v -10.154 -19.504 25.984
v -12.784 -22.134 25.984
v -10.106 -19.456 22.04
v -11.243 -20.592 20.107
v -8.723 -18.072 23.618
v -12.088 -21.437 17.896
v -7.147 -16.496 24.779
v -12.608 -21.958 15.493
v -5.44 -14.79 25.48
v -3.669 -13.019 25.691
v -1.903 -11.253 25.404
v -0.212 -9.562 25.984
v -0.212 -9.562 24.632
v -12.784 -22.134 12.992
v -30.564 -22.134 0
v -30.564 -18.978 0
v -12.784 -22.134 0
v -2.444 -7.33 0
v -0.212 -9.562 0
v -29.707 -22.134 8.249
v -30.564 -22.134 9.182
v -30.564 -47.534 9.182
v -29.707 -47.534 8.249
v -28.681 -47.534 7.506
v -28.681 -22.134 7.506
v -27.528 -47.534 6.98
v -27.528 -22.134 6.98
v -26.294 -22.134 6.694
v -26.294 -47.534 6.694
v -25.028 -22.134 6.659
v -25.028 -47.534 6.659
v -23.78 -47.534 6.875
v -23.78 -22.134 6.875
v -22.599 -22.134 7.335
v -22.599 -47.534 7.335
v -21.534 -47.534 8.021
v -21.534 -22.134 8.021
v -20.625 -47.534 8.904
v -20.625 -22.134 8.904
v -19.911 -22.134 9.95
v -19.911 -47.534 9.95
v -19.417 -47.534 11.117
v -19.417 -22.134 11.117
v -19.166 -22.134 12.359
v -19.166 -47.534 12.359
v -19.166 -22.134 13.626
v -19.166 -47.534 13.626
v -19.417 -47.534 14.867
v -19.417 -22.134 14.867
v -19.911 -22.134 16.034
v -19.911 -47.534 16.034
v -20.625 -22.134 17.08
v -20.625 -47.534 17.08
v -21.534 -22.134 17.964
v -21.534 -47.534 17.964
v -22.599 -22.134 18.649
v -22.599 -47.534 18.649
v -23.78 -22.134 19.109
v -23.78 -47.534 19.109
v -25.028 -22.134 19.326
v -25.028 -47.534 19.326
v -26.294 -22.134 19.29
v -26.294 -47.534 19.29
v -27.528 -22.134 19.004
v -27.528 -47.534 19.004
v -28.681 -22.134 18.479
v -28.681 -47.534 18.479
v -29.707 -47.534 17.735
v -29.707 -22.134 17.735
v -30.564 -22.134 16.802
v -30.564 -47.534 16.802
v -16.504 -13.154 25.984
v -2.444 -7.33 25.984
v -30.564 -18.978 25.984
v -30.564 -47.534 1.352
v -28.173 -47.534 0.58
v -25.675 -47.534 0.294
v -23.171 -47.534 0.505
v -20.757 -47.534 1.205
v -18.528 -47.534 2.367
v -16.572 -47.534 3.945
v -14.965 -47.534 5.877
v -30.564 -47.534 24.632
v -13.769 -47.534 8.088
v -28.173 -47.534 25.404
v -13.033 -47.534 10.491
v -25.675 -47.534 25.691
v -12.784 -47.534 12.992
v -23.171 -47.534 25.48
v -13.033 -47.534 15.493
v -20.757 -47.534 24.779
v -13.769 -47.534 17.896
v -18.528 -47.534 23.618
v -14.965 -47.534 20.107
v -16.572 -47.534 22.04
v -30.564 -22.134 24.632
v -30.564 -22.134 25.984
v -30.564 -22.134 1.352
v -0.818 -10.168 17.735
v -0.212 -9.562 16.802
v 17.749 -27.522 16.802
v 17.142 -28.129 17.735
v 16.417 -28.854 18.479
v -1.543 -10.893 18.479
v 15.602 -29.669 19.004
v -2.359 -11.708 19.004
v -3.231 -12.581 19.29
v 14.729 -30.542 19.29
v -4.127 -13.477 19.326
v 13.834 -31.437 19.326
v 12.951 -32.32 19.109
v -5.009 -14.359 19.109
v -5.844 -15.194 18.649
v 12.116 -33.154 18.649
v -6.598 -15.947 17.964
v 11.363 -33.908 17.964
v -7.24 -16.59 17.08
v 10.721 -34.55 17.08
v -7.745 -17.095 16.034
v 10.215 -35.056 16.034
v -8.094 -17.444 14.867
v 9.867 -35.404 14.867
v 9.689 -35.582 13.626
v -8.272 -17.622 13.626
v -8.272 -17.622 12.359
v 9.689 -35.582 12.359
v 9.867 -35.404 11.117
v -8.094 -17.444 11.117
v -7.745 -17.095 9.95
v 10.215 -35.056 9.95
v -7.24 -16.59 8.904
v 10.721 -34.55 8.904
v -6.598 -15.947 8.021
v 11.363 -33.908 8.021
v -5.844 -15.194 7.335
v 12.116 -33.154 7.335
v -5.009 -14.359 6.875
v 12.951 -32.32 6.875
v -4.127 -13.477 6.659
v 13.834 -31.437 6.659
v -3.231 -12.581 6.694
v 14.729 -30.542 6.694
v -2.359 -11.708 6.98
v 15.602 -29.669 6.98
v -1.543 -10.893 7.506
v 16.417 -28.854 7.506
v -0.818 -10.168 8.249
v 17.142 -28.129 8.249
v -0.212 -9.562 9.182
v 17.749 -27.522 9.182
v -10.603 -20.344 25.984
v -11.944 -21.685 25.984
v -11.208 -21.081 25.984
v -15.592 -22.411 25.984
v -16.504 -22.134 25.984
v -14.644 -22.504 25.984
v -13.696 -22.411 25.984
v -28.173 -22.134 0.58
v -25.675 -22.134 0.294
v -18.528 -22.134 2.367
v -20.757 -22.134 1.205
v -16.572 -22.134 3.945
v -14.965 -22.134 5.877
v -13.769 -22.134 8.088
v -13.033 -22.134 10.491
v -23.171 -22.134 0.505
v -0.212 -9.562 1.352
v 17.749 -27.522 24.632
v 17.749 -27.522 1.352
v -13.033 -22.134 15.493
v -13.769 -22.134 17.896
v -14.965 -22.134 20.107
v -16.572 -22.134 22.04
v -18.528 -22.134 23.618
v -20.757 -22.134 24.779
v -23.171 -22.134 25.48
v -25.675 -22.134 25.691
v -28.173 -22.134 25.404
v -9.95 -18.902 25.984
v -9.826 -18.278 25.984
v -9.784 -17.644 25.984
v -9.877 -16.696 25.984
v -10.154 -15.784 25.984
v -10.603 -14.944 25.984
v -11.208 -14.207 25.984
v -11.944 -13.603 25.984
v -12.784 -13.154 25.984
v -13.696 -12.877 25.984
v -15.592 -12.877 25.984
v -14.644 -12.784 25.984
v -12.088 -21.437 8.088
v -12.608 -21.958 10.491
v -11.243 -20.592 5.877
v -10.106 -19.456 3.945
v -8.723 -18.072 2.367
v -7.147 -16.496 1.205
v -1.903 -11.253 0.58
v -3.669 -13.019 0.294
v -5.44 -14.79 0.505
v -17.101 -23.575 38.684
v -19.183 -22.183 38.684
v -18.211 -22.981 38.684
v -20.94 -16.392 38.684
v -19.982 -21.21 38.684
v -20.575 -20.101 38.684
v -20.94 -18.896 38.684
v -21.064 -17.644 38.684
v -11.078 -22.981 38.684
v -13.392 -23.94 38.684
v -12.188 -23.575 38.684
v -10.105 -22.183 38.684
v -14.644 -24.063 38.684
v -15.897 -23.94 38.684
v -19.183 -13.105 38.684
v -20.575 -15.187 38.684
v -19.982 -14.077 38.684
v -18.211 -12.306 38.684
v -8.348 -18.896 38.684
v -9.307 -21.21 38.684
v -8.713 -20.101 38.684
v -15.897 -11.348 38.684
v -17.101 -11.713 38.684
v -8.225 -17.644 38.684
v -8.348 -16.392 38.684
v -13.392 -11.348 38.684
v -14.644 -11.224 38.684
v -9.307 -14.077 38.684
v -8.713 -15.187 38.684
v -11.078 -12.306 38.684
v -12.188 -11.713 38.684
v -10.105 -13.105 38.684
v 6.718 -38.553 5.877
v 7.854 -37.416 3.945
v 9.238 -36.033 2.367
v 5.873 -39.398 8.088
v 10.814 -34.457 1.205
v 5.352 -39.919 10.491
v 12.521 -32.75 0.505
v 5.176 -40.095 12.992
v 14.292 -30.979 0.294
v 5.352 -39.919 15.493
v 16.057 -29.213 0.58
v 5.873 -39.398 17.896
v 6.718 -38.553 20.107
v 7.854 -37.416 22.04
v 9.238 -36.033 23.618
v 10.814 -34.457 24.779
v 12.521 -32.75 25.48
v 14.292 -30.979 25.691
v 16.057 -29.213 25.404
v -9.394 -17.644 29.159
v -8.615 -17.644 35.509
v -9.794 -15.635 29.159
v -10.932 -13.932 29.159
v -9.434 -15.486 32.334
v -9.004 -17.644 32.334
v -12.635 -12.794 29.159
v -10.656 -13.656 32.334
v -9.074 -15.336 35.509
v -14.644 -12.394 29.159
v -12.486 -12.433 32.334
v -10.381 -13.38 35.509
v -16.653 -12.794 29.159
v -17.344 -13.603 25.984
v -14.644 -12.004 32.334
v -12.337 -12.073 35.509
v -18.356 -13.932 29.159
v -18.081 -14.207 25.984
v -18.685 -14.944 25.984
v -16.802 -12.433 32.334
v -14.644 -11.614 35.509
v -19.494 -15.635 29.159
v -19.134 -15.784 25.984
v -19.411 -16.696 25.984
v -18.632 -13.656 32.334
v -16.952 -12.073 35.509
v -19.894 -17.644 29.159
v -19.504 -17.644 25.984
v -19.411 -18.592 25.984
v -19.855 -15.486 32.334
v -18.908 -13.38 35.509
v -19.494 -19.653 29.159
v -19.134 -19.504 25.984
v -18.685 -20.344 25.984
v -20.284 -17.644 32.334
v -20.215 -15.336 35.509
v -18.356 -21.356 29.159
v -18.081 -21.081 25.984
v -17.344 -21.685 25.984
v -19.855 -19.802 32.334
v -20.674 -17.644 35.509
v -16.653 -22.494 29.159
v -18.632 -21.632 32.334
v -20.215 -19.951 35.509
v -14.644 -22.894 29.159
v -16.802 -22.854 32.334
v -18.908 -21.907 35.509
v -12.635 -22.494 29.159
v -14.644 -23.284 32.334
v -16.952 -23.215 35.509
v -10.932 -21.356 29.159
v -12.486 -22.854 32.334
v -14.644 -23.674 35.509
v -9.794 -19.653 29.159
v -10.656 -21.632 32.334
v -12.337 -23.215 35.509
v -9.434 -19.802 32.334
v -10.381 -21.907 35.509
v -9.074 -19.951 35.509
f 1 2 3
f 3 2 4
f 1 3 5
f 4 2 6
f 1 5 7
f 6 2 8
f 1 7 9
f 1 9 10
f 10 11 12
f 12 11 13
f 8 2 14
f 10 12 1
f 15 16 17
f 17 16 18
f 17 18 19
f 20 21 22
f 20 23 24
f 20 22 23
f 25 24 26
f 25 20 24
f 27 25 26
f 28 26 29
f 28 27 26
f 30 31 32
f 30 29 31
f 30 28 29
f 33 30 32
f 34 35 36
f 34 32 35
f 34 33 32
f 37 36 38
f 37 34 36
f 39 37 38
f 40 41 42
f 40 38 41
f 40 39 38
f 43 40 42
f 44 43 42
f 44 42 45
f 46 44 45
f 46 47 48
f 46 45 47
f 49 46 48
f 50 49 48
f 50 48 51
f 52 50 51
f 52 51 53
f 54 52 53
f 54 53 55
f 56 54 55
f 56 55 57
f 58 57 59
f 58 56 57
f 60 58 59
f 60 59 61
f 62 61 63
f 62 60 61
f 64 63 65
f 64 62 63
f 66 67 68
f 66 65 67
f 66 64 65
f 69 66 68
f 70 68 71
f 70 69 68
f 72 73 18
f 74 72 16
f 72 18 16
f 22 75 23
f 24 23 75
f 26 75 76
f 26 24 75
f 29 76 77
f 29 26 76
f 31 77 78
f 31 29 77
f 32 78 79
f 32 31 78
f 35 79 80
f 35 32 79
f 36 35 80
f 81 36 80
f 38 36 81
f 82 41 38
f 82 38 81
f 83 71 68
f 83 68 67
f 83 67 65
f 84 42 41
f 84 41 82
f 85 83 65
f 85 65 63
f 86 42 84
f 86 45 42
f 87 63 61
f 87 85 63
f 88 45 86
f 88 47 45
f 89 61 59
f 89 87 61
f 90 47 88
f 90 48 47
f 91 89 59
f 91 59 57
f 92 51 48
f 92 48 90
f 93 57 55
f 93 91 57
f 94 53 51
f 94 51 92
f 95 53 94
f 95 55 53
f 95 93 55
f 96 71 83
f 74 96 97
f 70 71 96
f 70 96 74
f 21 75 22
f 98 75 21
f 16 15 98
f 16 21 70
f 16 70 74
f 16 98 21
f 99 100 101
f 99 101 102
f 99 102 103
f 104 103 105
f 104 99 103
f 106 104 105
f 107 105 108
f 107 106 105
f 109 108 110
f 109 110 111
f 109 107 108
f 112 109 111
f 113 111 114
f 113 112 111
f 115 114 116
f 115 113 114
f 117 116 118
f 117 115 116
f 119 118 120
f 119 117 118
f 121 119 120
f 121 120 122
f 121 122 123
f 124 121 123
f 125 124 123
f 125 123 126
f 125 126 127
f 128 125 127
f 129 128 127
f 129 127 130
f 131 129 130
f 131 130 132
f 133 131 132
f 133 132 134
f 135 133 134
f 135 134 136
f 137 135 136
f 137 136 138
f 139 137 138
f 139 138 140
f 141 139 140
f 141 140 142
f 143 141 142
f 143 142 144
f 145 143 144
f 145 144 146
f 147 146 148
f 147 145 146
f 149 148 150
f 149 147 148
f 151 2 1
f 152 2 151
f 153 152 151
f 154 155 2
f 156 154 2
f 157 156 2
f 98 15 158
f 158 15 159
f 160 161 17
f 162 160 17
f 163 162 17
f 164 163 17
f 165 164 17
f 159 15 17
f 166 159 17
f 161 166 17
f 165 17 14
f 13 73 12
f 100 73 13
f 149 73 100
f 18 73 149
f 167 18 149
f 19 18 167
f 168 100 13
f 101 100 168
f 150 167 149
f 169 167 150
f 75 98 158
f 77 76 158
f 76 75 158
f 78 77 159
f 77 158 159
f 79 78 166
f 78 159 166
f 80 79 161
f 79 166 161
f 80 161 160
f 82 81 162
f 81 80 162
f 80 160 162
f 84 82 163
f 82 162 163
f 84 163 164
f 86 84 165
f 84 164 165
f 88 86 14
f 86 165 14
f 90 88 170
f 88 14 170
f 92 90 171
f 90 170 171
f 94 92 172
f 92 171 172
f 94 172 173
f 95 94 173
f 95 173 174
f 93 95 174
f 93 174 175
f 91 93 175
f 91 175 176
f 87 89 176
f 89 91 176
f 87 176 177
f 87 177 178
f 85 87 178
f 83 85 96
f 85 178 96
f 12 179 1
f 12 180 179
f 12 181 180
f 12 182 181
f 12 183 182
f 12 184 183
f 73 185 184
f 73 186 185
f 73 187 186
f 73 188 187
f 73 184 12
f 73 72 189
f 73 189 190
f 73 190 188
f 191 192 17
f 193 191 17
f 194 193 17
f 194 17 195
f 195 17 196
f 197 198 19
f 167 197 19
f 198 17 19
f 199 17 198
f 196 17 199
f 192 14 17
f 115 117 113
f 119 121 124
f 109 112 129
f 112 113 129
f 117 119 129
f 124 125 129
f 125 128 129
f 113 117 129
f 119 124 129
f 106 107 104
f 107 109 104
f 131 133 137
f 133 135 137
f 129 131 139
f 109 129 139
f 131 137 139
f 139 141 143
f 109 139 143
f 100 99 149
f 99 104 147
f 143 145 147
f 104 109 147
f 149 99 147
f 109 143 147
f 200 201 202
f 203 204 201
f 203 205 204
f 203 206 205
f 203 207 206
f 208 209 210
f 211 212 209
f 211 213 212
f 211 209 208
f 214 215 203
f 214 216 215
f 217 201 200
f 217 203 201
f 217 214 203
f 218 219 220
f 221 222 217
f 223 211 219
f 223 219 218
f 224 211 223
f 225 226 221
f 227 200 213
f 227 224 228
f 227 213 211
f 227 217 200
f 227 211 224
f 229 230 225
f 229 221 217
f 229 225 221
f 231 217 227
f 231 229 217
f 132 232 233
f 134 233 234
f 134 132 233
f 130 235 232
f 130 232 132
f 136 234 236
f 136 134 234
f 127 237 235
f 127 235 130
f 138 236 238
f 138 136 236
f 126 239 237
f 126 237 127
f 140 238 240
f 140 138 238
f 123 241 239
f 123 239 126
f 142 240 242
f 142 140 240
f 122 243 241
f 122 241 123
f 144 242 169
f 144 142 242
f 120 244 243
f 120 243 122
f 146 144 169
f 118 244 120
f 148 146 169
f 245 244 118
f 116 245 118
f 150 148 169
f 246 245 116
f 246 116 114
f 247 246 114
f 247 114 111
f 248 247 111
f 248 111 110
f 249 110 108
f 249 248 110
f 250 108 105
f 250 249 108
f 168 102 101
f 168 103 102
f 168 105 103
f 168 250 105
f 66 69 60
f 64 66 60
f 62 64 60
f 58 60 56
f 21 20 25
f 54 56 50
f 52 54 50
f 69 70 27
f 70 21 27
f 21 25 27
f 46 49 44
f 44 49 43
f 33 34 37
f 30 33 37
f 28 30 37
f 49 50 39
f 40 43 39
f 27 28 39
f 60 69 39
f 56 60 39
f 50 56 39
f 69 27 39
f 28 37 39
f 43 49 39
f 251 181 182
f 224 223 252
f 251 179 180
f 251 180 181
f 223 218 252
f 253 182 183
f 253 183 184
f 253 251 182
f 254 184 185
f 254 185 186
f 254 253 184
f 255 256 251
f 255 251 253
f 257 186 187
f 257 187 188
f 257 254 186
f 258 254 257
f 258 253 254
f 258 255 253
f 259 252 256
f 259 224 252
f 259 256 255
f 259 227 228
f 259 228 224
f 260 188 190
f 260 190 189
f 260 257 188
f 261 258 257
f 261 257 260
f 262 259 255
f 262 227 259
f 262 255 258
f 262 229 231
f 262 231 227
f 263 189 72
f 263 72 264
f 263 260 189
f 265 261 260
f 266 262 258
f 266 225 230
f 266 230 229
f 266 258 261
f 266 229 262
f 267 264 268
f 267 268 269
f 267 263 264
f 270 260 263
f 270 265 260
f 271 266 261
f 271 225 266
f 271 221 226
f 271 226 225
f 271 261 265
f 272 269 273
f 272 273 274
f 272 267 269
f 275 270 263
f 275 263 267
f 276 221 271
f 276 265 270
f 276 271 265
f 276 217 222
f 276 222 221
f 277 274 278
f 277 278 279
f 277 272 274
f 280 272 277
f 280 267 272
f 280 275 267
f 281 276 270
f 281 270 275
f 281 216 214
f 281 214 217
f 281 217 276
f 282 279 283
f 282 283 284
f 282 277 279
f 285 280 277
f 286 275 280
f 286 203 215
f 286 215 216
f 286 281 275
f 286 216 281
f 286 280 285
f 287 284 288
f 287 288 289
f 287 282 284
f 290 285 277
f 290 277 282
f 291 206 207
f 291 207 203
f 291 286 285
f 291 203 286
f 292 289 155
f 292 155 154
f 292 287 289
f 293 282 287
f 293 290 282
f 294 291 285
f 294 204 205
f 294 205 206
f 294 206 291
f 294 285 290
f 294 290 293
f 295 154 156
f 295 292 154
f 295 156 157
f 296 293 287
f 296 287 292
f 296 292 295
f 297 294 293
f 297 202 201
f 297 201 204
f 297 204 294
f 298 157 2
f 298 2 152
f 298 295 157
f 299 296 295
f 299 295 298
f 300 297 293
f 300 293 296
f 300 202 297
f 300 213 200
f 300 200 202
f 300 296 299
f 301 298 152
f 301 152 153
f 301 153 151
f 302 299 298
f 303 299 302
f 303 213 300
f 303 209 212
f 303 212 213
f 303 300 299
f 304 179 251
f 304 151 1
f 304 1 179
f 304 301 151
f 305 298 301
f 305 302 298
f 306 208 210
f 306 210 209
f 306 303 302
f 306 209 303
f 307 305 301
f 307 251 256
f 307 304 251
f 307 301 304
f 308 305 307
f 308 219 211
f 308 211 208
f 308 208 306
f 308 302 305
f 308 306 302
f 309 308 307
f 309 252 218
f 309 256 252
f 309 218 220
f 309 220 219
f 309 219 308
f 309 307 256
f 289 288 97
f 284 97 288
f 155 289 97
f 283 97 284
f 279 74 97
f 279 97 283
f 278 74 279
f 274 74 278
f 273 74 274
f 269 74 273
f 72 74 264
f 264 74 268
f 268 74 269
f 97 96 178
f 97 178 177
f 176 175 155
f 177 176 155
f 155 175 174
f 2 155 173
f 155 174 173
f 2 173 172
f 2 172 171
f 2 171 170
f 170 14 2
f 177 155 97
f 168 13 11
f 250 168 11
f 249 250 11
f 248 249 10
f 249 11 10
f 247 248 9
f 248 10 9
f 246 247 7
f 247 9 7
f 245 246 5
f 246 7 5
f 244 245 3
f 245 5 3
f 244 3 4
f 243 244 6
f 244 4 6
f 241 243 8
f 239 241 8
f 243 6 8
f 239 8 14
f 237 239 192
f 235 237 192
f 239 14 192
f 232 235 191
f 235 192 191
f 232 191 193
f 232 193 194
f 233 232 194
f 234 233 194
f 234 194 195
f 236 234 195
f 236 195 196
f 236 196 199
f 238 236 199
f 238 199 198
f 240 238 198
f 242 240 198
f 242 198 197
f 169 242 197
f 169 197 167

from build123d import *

# Parameters (mm, degrees)
F1_DEPTH = 25.9842
F2_R     = 12.7
F2_R_2   = 6.35
F3_DEPTH = 25.4
F4_R     = 12.7
F4_R_2   = 6.35
F5_DEPTH = 25.4
F7_R     = 4.860079591
F8_DEPTH = 12.7
F8_TAPER = -7
F6_W     = 22.3425124863
F6_H     = 36.2117751569
F9_DEPTH = 38.6852001


with BuildPart() as f1:
    # F0 (on Top) → F1 (new body)
    with BuildSketch(Plane.XY):
        Polygon((5.17619859, -4.1735334439), (-38.1843136522, -22.134045686), (-12.7843136522, -22.134045686), align=None)
    extrude(amount=F1_DEPTH)

    # F2 (on face) → F3 (join)
    with BuildSketch(Plane(origin=(4.6748660169, -4.6748660169, 0), x_dir=(0.7071067812, 0.7071067812, 0), z_dir=(0.7071067812, -0.7071067812, 0))):
        with Locations((-11.9910086759, 12.9921)):
            Circle(F2_R)
        with Locations((-11.9910086759, 12.9921)):
            Circle(F2_R_2, mode=Mode.SUBTRACT)
    extrude(amount=F3_DEPTH)

    # F4 (on face) → F5 (join)
    with BuildSketch(Plane.XZ.offset(22.134045686)):
        with Locations((-25.4843136522, 12.9921)):
            Circle(F4_R)
        with Locations((-25.4843136522, 12.9921)):
            Circle(F4_R_2, mode=Mode.SUBTRACT)
    extrude(amount=F5_DEPTH)

    # F7 (on face) → F8 (join)
    with BuildSketch(Plane.XY.offset(25.9842)):
        with Locations((-14.6441855916, -17.6439176255)):
            Circle(F7_R)
    extrude(amount=F8_DEPTH, taper=F8_TAPER)

    # F6 (on face) → F9 (cut, through all)
    with BuildSketch(Plane.XY):
        with Locations((-41.7355698953, -31.0400566086)):
            Rectangle(F6_W, F6_H)
        Polygon((34.686883608, -12.8634416315), (9.0812918357, 12.7421501407), (-6.7172502521, -3.0563919471), (18.8883415201, -28.6619837193), align=None)
    extrude(amount=F9_DEPTH, mode=Mode.SUBTRACT)


solid = f1.part
